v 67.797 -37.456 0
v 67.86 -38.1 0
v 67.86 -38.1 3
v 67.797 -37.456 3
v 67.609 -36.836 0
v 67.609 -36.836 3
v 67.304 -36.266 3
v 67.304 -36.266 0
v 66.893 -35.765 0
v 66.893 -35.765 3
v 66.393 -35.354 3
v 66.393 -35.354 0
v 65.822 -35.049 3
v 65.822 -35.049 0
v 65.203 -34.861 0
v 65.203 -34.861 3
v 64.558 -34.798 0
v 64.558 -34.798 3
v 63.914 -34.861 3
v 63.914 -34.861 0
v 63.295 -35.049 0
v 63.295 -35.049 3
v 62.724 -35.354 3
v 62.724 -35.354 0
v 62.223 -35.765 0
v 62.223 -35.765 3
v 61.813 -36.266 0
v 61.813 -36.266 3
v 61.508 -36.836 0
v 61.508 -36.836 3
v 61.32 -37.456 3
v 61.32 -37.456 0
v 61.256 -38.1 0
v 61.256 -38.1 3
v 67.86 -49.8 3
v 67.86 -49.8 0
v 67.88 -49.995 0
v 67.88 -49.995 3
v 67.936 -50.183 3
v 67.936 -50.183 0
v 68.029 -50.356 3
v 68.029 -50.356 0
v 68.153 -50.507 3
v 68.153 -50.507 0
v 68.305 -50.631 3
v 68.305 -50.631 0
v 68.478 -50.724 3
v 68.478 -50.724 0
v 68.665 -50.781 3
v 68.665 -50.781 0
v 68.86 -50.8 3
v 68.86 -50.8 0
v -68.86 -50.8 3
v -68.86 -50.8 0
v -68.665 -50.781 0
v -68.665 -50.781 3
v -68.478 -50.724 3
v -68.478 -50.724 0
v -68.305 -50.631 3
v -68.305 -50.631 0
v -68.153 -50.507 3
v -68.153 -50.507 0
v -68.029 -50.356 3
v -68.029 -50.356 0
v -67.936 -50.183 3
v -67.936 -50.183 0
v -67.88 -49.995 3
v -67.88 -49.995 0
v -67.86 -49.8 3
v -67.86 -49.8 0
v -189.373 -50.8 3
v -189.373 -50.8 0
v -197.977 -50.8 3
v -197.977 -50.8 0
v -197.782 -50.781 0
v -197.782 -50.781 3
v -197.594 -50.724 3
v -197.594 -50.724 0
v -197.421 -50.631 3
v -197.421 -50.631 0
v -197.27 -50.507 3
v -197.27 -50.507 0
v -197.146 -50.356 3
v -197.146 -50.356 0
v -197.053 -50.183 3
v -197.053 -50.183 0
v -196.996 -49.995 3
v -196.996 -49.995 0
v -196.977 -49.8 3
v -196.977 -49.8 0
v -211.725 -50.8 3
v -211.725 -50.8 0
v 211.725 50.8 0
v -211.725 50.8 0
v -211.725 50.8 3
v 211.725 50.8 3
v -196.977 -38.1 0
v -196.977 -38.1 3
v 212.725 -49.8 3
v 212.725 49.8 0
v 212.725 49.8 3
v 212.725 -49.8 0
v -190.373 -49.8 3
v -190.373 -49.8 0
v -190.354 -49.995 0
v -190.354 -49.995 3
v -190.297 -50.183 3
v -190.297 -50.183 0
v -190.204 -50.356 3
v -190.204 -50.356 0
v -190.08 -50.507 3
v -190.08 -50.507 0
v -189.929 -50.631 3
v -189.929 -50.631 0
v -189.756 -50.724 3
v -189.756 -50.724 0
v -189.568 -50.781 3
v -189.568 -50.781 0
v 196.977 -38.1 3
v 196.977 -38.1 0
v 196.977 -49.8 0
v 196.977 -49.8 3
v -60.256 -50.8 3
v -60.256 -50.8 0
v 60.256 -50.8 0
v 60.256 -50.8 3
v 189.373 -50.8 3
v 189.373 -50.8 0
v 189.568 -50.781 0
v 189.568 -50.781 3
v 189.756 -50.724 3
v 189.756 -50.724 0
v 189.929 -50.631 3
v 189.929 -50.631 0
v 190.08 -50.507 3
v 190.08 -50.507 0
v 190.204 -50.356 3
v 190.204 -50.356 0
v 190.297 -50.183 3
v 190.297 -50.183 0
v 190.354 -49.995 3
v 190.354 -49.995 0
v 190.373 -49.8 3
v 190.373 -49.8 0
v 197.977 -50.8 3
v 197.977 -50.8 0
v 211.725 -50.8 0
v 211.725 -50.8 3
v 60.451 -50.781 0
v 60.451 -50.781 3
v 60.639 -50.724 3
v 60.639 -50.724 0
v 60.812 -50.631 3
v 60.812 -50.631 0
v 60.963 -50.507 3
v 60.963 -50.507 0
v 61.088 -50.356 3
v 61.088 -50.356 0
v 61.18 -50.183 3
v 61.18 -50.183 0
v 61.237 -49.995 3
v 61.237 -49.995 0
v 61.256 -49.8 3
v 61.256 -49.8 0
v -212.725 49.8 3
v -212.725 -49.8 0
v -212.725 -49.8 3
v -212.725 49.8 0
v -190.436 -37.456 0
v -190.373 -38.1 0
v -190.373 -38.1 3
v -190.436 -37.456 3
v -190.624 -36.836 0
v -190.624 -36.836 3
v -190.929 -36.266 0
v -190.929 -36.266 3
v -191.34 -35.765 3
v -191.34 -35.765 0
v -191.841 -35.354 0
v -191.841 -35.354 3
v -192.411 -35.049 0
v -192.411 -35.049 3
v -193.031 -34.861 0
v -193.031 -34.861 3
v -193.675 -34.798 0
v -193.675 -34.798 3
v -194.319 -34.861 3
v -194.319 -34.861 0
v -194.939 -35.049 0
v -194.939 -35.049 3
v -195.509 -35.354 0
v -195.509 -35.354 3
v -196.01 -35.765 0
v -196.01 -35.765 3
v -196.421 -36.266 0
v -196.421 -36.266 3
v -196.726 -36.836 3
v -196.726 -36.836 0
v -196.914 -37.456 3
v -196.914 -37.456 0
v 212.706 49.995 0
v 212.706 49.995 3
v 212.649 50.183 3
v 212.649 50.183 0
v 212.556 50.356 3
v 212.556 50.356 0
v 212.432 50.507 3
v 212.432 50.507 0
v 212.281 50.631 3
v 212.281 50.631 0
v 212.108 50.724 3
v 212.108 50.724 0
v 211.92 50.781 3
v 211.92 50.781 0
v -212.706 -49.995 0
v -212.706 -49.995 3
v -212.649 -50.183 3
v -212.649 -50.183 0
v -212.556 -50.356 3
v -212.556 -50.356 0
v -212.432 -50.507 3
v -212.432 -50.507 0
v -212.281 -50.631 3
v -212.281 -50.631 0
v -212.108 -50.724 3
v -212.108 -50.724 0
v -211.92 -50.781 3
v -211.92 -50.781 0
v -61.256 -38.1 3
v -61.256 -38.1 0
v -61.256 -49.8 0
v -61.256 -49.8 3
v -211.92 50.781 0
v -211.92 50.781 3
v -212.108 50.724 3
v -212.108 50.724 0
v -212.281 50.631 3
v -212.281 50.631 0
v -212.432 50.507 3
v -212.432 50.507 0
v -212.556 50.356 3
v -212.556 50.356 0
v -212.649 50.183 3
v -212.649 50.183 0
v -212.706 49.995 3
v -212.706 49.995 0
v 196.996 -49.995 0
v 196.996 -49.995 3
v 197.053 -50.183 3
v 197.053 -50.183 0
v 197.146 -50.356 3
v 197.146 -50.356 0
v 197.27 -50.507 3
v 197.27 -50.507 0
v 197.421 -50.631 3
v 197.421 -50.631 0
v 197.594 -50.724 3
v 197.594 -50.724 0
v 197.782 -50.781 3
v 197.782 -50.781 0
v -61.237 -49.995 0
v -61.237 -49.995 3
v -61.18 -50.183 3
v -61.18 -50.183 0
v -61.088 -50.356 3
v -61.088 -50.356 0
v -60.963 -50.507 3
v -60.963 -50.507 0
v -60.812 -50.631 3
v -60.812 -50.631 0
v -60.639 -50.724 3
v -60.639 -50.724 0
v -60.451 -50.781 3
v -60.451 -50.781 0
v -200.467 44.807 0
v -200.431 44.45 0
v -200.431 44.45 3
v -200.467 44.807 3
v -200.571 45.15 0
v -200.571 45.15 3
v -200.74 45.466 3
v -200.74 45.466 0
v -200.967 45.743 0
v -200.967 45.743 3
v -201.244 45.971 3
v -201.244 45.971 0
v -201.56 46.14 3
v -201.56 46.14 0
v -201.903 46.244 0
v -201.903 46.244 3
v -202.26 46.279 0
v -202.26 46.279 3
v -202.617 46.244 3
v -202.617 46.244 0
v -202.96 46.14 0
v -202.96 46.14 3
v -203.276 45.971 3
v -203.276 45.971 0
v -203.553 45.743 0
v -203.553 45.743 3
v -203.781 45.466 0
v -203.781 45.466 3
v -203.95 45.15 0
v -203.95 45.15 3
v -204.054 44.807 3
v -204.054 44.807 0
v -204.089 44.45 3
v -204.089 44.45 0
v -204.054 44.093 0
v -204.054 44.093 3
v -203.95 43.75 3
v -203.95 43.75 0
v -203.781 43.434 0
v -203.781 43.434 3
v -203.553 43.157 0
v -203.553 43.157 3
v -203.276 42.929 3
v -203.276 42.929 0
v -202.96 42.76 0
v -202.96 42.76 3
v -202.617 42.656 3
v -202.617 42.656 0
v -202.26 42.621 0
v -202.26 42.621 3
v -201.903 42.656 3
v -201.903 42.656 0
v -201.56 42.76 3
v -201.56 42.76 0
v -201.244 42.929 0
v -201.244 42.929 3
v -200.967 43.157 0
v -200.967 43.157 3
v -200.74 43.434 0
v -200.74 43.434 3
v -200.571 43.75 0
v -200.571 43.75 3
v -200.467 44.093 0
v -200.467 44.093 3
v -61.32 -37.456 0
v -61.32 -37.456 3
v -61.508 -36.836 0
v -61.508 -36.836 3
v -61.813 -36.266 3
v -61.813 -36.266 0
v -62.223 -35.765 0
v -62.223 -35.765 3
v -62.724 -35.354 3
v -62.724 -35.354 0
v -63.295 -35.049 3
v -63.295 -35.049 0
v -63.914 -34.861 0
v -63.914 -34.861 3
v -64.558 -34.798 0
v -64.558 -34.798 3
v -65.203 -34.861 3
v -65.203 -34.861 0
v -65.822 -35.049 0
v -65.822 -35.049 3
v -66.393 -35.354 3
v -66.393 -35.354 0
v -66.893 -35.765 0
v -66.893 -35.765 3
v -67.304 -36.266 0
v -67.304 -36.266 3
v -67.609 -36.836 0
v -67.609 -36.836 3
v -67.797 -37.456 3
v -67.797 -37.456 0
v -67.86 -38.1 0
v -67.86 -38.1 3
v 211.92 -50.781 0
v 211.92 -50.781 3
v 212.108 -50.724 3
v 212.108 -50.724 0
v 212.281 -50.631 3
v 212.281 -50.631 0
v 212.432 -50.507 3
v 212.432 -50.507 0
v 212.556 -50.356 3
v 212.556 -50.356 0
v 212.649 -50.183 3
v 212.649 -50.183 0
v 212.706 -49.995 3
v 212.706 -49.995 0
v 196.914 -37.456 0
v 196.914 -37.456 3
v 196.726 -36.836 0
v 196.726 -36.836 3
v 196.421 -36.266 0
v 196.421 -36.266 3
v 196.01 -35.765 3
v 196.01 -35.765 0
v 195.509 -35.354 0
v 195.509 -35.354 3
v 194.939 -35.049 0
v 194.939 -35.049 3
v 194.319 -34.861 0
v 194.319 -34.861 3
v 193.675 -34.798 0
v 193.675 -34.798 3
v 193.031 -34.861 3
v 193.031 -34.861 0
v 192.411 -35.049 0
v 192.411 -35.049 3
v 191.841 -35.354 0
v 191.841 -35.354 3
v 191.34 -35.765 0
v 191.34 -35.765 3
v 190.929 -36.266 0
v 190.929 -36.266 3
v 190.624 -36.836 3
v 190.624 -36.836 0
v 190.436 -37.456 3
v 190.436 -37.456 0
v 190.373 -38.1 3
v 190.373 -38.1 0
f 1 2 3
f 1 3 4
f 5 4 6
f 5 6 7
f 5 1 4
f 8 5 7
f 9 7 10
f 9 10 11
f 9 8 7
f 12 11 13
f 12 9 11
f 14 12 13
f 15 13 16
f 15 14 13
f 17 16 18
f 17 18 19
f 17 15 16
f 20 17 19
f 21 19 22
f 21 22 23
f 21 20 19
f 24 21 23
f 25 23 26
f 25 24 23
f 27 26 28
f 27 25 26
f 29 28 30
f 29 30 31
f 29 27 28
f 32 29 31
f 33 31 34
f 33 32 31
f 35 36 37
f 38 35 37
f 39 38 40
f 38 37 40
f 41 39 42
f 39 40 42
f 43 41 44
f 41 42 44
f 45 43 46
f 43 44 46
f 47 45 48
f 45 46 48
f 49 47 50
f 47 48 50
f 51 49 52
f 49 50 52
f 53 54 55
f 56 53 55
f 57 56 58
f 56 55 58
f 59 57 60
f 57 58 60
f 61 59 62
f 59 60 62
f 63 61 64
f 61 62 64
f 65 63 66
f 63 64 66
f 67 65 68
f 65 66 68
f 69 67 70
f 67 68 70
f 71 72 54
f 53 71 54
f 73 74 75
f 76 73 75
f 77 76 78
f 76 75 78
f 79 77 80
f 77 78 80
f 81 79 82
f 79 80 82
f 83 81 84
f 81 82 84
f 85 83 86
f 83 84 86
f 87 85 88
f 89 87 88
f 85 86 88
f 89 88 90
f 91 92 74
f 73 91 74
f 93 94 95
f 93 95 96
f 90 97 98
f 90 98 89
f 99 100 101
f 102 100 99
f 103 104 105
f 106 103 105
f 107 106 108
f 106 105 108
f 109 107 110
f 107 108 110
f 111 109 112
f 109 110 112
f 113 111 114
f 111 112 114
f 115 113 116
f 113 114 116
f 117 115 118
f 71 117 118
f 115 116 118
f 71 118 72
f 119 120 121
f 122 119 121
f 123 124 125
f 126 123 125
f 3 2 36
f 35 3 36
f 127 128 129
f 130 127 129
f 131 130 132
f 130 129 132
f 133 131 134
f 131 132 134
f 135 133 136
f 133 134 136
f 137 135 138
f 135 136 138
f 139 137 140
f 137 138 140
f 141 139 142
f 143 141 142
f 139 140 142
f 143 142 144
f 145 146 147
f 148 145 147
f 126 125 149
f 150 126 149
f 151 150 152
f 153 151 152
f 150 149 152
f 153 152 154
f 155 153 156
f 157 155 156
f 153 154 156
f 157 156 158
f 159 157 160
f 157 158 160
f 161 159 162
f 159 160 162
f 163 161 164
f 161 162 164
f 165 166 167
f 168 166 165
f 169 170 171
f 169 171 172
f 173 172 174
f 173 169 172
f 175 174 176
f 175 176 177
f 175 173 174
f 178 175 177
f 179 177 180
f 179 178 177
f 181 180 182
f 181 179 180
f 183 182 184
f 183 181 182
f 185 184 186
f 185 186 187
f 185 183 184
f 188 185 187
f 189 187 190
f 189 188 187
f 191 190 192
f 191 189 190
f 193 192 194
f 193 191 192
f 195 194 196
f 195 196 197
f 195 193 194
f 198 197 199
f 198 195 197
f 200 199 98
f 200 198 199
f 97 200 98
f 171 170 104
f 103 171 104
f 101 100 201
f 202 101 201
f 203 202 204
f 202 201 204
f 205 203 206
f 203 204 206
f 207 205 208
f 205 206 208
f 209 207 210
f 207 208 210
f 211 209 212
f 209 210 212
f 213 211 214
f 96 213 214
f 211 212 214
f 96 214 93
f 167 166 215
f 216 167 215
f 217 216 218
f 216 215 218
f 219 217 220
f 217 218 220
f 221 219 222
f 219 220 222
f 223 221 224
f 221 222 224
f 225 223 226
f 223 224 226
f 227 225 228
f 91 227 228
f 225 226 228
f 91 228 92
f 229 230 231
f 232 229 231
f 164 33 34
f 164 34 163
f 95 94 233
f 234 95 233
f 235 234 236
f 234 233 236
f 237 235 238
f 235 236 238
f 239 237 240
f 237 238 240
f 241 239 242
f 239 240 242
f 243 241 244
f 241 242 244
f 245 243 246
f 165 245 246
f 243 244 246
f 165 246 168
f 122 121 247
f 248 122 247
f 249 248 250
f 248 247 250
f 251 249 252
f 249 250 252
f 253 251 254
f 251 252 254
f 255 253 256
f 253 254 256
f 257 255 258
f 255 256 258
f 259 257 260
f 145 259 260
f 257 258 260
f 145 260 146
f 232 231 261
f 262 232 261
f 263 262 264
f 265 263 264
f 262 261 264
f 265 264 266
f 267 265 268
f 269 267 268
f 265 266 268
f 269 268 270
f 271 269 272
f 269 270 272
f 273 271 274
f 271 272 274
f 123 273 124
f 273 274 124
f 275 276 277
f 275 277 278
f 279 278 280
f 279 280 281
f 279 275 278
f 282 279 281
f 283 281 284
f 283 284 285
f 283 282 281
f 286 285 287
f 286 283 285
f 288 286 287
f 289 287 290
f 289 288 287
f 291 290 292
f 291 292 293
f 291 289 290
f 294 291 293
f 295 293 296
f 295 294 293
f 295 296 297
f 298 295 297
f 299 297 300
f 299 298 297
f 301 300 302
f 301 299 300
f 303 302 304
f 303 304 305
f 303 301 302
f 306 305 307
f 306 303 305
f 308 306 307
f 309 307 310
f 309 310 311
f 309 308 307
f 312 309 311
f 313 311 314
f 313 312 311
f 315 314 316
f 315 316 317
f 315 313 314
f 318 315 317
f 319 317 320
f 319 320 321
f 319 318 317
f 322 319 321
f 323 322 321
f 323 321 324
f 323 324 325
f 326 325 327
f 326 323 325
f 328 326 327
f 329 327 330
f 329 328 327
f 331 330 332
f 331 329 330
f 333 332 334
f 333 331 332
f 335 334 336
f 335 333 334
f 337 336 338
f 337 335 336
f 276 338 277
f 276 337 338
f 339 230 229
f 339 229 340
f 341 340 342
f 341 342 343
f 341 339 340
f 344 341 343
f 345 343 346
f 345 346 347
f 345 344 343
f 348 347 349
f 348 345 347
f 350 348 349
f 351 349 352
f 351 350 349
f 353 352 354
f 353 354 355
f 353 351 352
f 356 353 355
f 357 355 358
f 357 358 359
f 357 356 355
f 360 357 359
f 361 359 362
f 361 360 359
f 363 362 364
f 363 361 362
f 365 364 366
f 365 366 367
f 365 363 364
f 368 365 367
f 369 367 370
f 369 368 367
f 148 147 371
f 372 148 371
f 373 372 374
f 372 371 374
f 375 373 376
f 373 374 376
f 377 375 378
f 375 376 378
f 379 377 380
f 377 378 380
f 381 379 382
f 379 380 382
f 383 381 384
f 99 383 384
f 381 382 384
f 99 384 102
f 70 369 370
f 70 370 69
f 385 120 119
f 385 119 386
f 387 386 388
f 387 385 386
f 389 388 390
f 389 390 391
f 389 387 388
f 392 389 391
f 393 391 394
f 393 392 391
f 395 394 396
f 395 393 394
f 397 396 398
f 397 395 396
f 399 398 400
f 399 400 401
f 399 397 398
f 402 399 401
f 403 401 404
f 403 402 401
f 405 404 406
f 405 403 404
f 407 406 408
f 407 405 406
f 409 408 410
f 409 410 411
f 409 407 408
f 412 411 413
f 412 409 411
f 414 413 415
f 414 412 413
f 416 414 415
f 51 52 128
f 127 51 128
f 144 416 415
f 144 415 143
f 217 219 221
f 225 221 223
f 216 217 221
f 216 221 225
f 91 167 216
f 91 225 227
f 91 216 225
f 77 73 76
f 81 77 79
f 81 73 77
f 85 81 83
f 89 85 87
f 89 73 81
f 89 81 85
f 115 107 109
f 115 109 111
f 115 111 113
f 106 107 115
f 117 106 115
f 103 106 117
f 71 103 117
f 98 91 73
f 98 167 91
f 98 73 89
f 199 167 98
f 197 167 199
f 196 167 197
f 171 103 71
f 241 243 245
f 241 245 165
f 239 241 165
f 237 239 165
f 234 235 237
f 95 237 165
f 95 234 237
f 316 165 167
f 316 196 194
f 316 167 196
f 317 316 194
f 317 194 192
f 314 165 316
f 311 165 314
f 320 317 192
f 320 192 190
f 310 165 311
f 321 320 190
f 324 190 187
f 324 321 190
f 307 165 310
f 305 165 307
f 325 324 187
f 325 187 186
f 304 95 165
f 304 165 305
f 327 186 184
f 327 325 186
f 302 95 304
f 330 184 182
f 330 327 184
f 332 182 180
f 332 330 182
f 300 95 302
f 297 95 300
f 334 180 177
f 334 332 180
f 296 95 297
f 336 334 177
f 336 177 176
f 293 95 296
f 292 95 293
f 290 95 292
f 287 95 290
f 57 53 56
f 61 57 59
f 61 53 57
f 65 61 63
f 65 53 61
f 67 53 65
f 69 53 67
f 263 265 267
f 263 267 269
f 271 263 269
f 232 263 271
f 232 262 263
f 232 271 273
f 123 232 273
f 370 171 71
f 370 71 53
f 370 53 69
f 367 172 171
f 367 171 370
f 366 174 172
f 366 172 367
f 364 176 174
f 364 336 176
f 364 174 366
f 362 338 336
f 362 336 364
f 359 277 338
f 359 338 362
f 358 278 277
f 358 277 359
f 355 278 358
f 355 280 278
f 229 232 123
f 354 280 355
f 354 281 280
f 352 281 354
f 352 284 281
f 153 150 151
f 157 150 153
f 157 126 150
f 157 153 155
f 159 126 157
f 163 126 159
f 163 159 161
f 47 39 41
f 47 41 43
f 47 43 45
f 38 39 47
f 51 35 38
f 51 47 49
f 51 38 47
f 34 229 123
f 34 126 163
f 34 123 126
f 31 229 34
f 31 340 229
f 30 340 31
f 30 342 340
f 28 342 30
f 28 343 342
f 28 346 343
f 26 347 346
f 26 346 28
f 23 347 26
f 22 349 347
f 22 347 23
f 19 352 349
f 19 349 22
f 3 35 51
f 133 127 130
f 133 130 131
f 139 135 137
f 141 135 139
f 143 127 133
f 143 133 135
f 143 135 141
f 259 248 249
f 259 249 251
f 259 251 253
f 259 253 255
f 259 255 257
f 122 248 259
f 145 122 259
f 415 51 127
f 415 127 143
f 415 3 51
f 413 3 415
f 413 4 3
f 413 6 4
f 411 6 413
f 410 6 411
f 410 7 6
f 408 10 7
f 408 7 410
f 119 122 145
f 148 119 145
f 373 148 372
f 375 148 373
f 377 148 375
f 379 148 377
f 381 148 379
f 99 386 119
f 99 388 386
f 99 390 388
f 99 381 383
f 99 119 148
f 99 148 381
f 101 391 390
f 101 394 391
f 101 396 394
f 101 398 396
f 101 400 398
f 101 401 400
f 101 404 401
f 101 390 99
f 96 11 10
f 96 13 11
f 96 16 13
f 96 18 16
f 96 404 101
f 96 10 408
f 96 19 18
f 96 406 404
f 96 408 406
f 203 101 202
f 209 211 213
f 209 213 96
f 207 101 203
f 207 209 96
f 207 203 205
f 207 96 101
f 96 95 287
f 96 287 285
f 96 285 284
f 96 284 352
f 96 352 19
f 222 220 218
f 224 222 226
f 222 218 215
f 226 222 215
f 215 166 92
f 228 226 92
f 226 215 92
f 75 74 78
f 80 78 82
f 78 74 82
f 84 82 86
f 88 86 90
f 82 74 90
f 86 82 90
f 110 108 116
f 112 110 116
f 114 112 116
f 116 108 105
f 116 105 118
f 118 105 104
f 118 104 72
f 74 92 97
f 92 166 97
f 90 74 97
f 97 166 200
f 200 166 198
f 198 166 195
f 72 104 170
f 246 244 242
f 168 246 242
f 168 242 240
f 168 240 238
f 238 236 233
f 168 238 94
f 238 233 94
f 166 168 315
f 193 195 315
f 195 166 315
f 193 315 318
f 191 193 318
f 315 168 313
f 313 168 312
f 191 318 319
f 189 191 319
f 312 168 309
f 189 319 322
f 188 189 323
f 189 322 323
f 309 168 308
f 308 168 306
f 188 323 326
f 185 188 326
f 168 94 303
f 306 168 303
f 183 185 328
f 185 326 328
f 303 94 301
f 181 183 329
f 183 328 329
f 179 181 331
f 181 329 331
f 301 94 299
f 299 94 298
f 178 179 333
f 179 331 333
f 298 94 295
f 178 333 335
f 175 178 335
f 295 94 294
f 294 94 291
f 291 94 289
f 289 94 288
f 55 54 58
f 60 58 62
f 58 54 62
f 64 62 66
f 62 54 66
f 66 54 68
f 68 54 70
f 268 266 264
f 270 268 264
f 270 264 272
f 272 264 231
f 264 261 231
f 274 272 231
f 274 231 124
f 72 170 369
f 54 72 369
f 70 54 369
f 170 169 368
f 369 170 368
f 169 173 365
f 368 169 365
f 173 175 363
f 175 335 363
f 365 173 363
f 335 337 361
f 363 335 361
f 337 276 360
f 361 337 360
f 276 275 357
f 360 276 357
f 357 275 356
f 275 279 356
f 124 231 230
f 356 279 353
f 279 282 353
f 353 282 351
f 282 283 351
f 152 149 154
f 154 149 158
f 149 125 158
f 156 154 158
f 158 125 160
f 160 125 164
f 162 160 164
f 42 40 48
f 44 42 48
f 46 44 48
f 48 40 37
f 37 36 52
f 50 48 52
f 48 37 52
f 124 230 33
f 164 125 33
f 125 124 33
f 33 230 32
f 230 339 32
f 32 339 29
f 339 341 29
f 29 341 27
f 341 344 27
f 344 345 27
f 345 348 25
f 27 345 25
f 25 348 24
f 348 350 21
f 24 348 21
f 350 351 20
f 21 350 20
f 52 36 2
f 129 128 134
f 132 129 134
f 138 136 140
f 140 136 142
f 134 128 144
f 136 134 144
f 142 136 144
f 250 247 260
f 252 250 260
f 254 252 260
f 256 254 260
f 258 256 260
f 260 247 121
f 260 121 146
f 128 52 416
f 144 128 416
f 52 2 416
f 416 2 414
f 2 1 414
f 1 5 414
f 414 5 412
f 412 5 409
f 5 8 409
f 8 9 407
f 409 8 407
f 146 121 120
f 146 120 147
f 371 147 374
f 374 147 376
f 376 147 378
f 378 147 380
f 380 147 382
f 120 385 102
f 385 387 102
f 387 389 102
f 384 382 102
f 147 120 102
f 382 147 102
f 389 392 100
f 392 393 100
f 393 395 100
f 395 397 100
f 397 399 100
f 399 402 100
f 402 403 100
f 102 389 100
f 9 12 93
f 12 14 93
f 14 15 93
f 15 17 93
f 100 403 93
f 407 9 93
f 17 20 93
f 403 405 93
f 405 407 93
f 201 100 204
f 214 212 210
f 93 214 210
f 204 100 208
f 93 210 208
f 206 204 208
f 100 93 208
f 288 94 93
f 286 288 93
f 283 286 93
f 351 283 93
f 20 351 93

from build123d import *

# Parameters (mm, degrees)
SKETCH_R  = 1.8288
PAD_DEPTH = 3


with BuildPart() as part:
    # Sketch → Pad (new body)
    with BuildSketch(Plane.XY):
        with BuildLine():
            ThreePointArc((-211.725, 50.8), (-212.432107, 50.507107), (-212.725, 49.8))
            Line((-212.725, -49.8), (-212.725, 49.8))
            ThreePointArc((-212.725, -49.8), (-212.432107, -50.507107), (-211.725, -50.8))
            Line((-211.725, -50.8), (-197.977, -50.8))
            ThreePointArc((-197.977, -50.8), (-197.269893, -50.507107), (-196.977, -49.8))
            Line((-196.977, -38.1), (-196.977, -49.8))
            ThreePointArc((-190.373, -38.1), (-193.675, -34.798), (-196.977, -38.1))
            Line((-190.373, -38.1), (-190.373, -49.8))
            ThreePointArc((-190.373, -49.8), (-190.080107, -50.507107), (-189.373, -50.8))
            Line((-189.373, -50.8), (-68.860333, -50.8))
            ThreePointArc((-68.860333, -50.8), (-68.153227, -50.507107), (-67.860333, -49.8))
            Line((-67.860333, -38.1), (-67.860333, -49.8))
            ThreePointArc((-61.256333, -38.1), (-64.558333, -34.798), (-67.860333, -38.1))
            Line((-61.256333, -38.1), (-61.256333, -49.8))
            ThreePointArc((-61.256333, -49.8), (-60.96344, -50.507107), (-60.256333, -50.8))
            Line((-60.256333, -50.8), (60.256333, -50.8))
            ThreePointArc((60.256333, -50.8), (60.96344, -50.507107), (61.256333, -49.8))
            Line((61.256333, -38.1), (61.256333, -49.8))
            ThreePointArc((67.860333, -38.1), (64.558333, -34.798), (61.256333, -38.1))
            Line((67.860333, -38.1), (67.860333, -49.8))
            ThreePointArc((67.860333, -49.8), (68.153227, -50.507107), (68.860333, -50.8))
            Line((68.860333, -50.8), (189.373, -50.8))
            ThreePointArc((189.373, -50.8), (190.080107, -50.507107), (190.373, -49.8))
            Line((190.373, -38.1), (190.373, -49.8))
            ThreePointArc((196.977, -38.1), (193.675, -34.798), (190.373, -38.1))
            Line((196.977, -38.1), (196.977, -49.8))
            ThreePointArc((196.977, -49.8), (197.269893, -50.507107), (197.977, -50.8))
            Line((197.977, -50.8), (211.725, -50.8))
            ThreePointArc((211.725, -50.8), (212.432107, -50.507107), (212.725, -49.8))
            Line((212.725, 49.8), (212.725, -49.8))
            ThreePointArc((212.725, 49.8), (212.432107, 50.507107), (211.725, 50.8))
            Line((-211.725, 50.8), (211.725, 50.8))
        make_face()
        with Locations((-202.2602, 44.45)):
            Circle(SKETCH_R, mode=Mode.SUBTRACT)
    extrude(amount=PAD_DEPTH)


solid = part.part
